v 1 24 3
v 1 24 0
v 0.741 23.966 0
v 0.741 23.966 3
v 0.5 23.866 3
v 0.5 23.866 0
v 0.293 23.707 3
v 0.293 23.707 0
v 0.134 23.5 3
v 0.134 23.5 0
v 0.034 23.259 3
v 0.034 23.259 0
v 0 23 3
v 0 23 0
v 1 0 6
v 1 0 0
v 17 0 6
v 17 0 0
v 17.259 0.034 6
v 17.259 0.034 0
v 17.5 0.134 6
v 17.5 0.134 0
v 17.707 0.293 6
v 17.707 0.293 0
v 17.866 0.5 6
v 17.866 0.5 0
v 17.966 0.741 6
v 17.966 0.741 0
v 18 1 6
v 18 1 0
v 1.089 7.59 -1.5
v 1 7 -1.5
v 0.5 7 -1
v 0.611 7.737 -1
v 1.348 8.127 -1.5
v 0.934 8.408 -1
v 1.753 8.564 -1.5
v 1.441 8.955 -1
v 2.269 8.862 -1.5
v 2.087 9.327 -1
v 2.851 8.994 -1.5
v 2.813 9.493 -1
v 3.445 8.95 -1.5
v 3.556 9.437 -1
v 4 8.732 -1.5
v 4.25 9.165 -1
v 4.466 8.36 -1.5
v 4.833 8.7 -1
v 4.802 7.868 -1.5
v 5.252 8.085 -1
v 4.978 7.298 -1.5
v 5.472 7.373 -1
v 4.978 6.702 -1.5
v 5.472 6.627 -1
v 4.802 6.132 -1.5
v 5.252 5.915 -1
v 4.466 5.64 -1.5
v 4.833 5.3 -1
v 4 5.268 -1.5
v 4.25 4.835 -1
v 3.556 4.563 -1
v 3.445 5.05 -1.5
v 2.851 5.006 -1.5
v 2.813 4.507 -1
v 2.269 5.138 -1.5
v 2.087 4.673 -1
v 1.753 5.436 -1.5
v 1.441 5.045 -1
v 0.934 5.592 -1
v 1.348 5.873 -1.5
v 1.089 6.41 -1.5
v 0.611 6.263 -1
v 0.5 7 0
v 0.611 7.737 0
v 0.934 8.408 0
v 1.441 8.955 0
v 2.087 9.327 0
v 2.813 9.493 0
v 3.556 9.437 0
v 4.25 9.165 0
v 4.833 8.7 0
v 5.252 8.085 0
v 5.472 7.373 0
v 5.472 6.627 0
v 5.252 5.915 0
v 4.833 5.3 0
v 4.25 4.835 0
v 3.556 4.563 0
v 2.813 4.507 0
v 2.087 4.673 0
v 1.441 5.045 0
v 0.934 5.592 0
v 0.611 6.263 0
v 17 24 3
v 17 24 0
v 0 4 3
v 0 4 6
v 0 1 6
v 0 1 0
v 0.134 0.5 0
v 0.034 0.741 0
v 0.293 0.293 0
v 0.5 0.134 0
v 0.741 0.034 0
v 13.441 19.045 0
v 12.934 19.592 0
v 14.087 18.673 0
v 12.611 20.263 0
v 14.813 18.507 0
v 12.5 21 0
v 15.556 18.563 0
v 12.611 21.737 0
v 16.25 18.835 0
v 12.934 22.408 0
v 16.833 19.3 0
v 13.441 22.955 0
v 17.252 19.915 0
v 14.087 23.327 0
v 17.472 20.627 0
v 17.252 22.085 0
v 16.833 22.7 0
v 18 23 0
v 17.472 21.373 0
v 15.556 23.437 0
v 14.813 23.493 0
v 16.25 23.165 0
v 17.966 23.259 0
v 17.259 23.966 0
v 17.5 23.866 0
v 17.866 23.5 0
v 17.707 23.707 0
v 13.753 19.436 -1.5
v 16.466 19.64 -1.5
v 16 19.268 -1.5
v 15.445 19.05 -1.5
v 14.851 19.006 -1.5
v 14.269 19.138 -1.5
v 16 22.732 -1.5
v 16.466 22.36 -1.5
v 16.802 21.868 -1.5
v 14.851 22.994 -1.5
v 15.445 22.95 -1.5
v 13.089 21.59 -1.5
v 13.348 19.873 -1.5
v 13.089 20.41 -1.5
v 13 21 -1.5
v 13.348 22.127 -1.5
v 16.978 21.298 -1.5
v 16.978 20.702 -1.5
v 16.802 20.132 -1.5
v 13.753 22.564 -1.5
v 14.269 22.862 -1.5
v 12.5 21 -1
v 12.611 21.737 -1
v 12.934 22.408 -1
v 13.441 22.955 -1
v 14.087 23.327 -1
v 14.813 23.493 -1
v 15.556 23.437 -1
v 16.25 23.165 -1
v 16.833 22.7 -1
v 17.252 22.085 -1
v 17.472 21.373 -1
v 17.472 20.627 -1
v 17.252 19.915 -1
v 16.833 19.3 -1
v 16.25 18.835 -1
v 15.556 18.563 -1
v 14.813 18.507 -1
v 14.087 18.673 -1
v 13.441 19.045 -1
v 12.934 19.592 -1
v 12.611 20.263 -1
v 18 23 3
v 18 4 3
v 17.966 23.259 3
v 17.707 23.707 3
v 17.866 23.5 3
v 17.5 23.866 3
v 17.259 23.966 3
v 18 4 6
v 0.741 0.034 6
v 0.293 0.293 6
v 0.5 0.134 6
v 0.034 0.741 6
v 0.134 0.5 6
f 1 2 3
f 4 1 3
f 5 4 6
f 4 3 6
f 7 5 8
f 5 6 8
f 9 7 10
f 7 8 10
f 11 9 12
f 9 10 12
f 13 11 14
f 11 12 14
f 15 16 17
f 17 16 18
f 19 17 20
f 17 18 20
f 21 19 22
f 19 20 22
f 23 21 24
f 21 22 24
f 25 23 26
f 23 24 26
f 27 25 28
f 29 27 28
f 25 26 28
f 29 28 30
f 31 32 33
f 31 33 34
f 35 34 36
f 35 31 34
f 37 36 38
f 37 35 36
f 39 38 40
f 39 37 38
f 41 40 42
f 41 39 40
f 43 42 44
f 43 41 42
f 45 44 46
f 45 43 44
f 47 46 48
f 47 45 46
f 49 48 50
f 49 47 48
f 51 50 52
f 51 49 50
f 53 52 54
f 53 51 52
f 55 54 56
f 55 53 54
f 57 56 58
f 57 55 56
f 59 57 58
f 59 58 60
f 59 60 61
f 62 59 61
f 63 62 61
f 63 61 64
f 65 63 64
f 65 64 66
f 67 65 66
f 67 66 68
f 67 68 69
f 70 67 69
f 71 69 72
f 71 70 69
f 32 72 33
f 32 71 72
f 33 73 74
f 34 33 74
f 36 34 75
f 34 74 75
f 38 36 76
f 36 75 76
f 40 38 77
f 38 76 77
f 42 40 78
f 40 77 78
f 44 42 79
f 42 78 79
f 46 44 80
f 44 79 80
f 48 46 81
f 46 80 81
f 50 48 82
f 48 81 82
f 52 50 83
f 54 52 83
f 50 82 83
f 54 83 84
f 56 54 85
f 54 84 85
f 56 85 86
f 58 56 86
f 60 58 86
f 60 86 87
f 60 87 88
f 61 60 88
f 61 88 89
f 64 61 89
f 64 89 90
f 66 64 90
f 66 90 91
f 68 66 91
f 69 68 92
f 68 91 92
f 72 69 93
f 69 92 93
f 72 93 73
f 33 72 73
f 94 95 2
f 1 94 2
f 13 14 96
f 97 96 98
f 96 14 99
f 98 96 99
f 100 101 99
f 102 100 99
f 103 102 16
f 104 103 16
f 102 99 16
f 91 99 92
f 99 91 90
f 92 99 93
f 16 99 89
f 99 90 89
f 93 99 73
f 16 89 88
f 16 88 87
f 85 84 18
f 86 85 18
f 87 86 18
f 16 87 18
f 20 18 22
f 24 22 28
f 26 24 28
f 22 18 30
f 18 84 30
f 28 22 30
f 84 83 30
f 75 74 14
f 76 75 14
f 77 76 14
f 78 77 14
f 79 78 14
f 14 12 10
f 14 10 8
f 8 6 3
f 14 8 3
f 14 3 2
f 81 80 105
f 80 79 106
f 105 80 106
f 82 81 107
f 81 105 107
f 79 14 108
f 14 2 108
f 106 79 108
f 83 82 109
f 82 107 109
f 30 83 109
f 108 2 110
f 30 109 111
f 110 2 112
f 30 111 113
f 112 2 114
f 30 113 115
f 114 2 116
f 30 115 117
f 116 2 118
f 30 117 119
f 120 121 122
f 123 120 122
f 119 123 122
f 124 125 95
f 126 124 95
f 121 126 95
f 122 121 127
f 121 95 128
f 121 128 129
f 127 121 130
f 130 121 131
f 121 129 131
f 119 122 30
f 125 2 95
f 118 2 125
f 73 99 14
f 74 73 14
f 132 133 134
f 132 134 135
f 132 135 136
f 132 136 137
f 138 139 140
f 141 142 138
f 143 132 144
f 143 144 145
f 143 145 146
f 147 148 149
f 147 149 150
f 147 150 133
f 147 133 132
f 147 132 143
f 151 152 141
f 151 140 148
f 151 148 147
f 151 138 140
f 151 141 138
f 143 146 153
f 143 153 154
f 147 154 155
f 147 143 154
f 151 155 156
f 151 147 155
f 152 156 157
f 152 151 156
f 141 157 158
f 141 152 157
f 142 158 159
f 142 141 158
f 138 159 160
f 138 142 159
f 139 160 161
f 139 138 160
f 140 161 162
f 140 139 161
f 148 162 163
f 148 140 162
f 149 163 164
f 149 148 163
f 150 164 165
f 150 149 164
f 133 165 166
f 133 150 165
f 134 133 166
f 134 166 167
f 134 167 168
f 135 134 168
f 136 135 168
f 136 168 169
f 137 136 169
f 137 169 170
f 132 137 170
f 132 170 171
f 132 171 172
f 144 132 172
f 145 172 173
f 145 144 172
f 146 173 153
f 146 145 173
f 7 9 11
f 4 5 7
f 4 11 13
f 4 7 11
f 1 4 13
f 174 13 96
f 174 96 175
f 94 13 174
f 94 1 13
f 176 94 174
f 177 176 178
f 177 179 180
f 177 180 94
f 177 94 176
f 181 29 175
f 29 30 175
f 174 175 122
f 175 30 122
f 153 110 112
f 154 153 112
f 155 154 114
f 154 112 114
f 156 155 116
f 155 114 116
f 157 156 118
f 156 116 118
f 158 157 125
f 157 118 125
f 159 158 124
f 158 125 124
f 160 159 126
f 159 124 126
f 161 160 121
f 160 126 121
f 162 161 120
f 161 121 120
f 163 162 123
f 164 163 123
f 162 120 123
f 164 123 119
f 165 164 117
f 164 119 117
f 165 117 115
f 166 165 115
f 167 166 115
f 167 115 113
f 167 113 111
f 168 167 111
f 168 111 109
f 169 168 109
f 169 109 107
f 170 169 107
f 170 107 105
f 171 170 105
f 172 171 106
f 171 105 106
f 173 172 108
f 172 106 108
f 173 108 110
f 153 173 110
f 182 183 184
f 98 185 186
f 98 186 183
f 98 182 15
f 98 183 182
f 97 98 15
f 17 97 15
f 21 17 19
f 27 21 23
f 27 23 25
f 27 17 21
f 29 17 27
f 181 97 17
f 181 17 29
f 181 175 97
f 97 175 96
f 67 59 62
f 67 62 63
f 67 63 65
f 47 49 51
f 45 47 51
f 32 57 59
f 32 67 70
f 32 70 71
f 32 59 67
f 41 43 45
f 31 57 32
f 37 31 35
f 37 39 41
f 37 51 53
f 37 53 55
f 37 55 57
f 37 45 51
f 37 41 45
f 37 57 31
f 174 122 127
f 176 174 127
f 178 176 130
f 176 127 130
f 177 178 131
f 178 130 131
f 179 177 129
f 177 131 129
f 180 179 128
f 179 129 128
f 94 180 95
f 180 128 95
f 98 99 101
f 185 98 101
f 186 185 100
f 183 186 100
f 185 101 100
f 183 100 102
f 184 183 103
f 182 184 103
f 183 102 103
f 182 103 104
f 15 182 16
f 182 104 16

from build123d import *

# Parameters (mm, degrees)
BOSS_EXTRUDE1_DEPTH = 3
BOSS_EXTRUDE2_DEPTH = 3
SKETCH3_R           = 2.5
BOSS_EXTRUDE3_DEPTH = 1.5
CHAMFER1_SIZE       = 0.5


with BuildPart() as part:
    # Sketch1 → Boss-Extrude1 (new body)
    with BuildSketch(Plane.XY):
        with BuildLine():
            Line((1, 0), (17, 0))
            ThreePointArc((17, 0), (17.707106781, 0.292893219), (18, 1))
            Line((18, 1), (18, 23))
            ThreePointArc((18, 23), (17.707106781, 23.707106781), (17, 24))
            Line((17, 24), (1, 24))
            ThreePointArc((1, 24), (0.292893219, 23.707106781), (0, 23))
            Line((0, 23), (0, 1))
            ThreePointArc((0, 1), (0.292893219, 0.292893219), (1, 0))
        make_face()
    extrude(amount=BOSS_EXTRUDE1_DEPTH)

    # Sketch2 → Boss-Extrude2 (add)
    with BuildSketch(Plane.XY.offset(3)):
        with BuildLine():
            Line((1, 0), (17, 0))
            ThreePointArc((17, 0), (17.707106781, 0.292893219), (18, 1))
            Line((18, 1), (18, 4))
            Line((18, 4), (0, 4))
            Line((0, 4), (0, 1))
            ThreePointArc((0, 1), (0.292893219, 0.292893219), (1, 0))
        make_face()
    extrude(amount=BOSS_EXTRUDE2_DEPTH)

    # Sketch3 → Boss-Extrude3 (add)
    with BuildSketch(Plane(origin=(0, 0, 0), x_dir=(-1, 0, 0), z_dir=(0, 0, -1))):
        with Locations((-15, 21)):
            Circle(SKETCH3_R)
        with Locations((-3, 7)):
            Circle(SKETCH3_R)
    extrude(amount=BOSS_EXTRUDE3_DEPTH)

    # Chamfer1
    chamfer1_edges = [part.edges().sort_by_distance(p)[0] for p in [
        (17.5, 21, -1.5),
        (5.5, 7, -1.5),
    ]]
    chamfer(chamfer1_edges, length=CHAMFER1_SIZE)


solid = part.part
